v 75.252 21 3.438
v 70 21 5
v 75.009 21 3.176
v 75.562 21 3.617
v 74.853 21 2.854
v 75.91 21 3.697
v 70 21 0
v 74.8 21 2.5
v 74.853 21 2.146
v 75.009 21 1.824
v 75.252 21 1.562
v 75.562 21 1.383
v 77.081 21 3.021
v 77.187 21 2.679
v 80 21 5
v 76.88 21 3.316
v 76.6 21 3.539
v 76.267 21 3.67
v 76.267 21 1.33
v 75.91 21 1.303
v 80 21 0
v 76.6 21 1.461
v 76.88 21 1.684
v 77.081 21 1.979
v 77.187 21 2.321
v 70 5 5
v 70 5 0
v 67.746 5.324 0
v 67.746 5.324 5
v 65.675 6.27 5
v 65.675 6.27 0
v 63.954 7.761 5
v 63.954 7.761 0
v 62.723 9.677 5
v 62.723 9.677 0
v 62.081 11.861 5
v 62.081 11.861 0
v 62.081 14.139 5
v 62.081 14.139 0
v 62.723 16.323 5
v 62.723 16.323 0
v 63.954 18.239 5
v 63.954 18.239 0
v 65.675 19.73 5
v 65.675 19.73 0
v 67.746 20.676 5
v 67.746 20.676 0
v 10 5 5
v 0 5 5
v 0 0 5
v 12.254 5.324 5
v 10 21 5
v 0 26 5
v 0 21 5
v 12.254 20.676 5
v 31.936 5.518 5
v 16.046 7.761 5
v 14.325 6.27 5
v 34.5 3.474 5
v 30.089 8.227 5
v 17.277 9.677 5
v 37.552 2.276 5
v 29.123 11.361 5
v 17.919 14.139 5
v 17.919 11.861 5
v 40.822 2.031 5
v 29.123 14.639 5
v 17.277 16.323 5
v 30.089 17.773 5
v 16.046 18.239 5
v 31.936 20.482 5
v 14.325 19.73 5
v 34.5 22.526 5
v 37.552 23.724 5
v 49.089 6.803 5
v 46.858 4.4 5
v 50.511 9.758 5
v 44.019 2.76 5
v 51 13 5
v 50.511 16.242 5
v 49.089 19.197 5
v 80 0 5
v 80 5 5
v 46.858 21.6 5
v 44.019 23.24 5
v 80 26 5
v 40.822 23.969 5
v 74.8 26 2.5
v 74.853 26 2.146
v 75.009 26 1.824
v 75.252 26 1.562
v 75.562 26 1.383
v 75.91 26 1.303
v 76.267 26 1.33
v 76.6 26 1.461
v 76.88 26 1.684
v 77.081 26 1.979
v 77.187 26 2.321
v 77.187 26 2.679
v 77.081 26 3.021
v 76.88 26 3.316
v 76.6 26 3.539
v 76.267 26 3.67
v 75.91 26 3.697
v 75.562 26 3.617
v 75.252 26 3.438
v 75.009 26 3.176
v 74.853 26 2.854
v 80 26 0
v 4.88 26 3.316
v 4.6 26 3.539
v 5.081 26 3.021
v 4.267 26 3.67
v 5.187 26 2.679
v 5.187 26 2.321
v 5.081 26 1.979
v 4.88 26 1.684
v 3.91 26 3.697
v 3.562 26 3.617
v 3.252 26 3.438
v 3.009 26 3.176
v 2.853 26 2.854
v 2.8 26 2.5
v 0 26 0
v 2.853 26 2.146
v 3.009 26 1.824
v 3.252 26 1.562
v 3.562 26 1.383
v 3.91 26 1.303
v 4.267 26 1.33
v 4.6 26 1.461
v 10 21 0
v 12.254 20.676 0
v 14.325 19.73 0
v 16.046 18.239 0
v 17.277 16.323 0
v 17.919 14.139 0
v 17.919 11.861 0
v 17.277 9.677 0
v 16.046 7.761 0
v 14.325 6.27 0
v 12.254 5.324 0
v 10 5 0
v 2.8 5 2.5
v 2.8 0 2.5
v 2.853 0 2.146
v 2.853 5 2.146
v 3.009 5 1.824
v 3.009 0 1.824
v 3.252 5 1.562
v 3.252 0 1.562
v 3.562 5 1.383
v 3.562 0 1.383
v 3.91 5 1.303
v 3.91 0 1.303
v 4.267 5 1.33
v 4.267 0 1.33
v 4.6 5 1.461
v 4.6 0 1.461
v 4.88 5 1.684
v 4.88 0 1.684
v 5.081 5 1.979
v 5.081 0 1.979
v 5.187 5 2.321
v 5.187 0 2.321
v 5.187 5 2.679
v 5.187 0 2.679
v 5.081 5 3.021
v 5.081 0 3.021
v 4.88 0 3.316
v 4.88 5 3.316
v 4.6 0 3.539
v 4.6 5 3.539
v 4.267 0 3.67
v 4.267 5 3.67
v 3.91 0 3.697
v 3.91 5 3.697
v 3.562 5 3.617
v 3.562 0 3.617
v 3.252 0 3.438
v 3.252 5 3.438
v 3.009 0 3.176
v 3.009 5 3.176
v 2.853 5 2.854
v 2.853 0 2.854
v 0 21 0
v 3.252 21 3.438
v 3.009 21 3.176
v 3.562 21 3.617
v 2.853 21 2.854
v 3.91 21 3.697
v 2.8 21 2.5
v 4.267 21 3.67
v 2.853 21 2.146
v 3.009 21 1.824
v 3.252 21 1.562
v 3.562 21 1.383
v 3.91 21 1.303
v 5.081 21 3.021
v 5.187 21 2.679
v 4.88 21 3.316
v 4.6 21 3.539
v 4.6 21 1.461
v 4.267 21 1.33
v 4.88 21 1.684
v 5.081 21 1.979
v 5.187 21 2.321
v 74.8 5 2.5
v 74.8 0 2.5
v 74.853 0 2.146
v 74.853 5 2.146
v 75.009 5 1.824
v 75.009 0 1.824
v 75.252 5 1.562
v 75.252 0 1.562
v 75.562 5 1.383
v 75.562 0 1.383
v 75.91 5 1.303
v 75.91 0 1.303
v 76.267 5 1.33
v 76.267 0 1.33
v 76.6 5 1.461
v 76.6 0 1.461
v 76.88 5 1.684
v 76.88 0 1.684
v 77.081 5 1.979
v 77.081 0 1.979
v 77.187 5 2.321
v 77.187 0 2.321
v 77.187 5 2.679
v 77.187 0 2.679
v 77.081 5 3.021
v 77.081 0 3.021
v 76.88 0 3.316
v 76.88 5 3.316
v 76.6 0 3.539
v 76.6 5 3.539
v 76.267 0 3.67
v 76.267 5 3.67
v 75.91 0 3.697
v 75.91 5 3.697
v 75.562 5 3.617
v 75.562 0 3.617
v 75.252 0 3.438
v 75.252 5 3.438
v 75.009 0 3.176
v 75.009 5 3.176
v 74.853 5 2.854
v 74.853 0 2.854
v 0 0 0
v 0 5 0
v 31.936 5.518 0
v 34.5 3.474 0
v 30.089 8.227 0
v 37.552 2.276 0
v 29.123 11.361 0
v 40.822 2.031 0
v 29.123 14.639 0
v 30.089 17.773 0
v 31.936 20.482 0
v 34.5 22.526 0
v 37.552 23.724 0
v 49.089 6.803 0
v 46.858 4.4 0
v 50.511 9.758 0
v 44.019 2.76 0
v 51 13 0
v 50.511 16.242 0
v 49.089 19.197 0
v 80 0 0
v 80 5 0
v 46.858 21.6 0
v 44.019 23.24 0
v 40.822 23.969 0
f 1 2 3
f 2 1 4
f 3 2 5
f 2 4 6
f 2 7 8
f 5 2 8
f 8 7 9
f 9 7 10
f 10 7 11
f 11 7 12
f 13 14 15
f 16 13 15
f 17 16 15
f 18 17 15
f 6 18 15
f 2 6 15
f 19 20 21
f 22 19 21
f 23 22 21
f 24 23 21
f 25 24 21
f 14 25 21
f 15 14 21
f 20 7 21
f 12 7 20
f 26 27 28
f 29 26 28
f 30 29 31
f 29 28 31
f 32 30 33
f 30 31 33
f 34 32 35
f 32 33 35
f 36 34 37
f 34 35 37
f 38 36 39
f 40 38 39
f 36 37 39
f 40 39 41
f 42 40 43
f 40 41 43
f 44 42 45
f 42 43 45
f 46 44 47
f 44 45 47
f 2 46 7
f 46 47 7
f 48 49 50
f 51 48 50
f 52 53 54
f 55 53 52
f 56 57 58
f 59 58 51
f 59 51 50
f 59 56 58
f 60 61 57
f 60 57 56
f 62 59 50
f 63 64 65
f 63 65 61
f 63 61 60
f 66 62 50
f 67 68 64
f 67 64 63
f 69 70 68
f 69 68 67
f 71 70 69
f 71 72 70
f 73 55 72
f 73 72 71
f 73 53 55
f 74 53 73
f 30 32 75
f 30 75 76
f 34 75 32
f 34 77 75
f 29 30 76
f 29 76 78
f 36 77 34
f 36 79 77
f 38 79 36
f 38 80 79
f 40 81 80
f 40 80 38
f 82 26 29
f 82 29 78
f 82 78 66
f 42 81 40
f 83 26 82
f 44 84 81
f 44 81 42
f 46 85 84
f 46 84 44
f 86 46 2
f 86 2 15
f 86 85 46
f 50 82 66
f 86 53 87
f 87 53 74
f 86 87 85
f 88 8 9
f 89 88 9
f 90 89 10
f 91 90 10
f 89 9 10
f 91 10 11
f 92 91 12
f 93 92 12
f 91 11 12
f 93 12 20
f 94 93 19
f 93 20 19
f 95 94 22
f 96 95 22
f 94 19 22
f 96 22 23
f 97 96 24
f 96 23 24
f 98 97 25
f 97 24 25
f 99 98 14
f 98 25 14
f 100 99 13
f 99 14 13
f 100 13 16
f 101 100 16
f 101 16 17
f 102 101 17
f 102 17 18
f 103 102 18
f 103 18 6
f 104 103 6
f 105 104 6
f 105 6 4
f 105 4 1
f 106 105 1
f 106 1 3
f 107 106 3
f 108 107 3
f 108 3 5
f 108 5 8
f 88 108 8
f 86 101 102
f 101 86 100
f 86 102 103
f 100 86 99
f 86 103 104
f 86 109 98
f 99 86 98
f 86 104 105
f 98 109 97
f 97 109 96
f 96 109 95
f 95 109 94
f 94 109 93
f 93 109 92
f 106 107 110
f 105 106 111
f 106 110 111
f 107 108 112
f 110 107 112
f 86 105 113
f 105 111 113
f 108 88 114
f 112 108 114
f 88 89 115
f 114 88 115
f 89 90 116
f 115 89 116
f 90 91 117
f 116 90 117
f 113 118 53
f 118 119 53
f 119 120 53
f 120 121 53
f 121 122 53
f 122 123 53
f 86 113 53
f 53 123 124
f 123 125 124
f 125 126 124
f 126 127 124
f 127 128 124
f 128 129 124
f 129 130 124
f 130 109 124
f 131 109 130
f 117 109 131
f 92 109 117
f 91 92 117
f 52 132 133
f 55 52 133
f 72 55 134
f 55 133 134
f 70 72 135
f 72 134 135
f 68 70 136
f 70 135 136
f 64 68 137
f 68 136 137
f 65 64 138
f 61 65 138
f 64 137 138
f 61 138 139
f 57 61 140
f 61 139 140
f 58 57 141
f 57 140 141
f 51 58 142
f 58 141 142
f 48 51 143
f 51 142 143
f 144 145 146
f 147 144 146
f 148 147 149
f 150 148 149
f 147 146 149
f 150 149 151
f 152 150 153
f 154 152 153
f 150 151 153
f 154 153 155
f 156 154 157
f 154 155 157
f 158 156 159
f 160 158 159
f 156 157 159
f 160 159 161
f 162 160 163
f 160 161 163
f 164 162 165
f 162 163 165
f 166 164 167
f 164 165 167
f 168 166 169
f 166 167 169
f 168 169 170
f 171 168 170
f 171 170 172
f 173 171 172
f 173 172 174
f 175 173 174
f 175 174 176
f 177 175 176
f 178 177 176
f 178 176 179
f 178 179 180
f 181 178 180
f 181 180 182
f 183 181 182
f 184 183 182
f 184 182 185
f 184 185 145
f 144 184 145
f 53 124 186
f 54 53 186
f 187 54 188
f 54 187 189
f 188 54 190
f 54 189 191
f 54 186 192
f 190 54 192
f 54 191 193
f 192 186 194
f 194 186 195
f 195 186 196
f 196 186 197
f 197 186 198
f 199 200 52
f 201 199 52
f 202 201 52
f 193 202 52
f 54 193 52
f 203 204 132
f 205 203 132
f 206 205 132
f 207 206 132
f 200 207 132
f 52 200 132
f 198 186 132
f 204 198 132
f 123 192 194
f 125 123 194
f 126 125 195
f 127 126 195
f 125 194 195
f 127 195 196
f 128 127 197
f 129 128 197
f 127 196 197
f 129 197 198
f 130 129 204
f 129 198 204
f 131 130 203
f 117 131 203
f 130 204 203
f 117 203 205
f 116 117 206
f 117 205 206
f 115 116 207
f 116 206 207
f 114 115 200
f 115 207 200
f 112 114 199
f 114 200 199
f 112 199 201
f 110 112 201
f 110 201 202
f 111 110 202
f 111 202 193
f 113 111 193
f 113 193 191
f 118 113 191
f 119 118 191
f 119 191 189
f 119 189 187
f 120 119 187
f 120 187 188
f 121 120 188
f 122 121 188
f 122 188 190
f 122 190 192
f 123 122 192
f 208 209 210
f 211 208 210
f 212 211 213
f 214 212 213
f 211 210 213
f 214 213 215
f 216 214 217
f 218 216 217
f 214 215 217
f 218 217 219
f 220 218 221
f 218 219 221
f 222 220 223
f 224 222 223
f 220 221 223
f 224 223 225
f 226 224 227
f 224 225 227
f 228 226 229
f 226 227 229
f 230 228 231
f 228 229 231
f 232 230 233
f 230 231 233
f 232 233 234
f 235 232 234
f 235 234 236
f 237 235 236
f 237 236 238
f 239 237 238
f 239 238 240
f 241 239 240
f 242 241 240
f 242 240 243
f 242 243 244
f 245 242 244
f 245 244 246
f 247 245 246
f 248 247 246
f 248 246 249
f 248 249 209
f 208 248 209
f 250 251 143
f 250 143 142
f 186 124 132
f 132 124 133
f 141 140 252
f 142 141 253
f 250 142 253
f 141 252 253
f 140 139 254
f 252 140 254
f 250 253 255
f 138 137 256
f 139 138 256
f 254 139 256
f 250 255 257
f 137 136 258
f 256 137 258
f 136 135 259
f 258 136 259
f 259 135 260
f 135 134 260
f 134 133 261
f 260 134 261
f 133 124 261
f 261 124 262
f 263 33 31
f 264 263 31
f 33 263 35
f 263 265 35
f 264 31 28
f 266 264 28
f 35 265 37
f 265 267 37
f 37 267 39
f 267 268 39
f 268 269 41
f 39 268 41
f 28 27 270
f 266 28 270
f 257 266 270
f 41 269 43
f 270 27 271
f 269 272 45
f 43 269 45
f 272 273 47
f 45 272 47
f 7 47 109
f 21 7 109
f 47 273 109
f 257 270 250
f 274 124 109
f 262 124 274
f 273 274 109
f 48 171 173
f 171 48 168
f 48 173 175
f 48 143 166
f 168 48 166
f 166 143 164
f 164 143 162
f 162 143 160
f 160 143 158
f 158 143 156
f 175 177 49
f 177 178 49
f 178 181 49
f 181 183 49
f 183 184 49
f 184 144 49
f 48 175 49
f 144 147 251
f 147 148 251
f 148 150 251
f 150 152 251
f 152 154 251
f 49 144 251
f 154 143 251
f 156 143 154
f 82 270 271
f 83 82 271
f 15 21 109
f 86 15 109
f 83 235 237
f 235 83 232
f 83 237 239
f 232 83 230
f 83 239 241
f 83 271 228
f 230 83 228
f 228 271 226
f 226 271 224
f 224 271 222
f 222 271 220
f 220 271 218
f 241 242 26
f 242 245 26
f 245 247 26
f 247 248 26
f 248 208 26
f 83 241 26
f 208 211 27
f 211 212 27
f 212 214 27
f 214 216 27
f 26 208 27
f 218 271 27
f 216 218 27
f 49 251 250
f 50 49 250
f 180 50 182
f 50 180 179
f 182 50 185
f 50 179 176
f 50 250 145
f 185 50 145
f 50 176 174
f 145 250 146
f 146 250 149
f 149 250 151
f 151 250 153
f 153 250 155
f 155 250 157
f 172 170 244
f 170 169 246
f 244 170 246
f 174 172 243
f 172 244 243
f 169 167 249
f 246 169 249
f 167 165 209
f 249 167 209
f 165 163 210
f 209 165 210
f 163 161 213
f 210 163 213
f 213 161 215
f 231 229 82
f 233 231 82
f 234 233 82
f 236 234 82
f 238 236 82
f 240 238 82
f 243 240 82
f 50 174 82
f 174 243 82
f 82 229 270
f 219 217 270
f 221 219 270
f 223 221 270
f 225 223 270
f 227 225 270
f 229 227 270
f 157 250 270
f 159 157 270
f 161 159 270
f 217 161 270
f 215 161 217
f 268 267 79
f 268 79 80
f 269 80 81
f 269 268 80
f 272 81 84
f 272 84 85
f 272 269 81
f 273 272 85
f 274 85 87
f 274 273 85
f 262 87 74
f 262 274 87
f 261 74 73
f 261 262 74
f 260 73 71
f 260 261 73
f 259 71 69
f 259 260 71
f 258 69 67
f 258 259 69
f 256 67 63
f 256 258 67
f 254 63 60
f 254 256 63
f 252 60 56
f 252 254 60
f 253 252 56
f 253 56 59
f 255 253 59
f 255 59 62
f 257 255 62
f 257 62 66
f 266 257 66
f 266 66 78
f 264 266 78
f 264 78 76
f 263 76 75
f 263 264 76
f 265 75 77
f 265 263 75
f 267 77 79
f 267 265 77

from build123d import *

# Parameters (mm, degrees)
ESQUISSE1_R        = 11
BOSS_EXTRU_1_DEPTH = 5
D_GAGEMENT_M21_D   = 2.4


with BuildPart() as part:
    # Esquisse1 → Boss.-Extru.1 (new body)
    with BuildSketch(Plane.XY):
        with BuildLine():
            Line((0, 0), (80, 0))
            Line((80, 0), (80, 5))
            Line((80, 5), (70, 5))
            ThreePointArc((70, 5), (62, 13), (70, 21))
            Line((70, 21), (80, 21))
            Line((80, 21), (80, 26))
            Line((80, 26), (0, 26))
            Line((0, 26), (0, 21))
            Line((0, 21), (10, 21))
            ThreePointArc((10, 21), (18, 13), (10, 5))
            Line((10, 5), (0, 5))
            Line((0, 5), (0, 0))
        make_face()
        with Locations((40, 13)):
            Circle(ESQUISSE1_R, mode=Mode.SUBTRACT)
    extrude(amount=BOSS_EXTRU_1_DEPTH)

    # Dégagement M21 (through all)
    with Locations(Plane(origin=(0, 26, 0), x_dir=(1, 0, 0), z_dir=(0, 1, 0))):
        with Locations((76, -2.5), (4, -2.5)):
            Hole(D_GAGEMENT_M21_D / 2)


solid = part.part
